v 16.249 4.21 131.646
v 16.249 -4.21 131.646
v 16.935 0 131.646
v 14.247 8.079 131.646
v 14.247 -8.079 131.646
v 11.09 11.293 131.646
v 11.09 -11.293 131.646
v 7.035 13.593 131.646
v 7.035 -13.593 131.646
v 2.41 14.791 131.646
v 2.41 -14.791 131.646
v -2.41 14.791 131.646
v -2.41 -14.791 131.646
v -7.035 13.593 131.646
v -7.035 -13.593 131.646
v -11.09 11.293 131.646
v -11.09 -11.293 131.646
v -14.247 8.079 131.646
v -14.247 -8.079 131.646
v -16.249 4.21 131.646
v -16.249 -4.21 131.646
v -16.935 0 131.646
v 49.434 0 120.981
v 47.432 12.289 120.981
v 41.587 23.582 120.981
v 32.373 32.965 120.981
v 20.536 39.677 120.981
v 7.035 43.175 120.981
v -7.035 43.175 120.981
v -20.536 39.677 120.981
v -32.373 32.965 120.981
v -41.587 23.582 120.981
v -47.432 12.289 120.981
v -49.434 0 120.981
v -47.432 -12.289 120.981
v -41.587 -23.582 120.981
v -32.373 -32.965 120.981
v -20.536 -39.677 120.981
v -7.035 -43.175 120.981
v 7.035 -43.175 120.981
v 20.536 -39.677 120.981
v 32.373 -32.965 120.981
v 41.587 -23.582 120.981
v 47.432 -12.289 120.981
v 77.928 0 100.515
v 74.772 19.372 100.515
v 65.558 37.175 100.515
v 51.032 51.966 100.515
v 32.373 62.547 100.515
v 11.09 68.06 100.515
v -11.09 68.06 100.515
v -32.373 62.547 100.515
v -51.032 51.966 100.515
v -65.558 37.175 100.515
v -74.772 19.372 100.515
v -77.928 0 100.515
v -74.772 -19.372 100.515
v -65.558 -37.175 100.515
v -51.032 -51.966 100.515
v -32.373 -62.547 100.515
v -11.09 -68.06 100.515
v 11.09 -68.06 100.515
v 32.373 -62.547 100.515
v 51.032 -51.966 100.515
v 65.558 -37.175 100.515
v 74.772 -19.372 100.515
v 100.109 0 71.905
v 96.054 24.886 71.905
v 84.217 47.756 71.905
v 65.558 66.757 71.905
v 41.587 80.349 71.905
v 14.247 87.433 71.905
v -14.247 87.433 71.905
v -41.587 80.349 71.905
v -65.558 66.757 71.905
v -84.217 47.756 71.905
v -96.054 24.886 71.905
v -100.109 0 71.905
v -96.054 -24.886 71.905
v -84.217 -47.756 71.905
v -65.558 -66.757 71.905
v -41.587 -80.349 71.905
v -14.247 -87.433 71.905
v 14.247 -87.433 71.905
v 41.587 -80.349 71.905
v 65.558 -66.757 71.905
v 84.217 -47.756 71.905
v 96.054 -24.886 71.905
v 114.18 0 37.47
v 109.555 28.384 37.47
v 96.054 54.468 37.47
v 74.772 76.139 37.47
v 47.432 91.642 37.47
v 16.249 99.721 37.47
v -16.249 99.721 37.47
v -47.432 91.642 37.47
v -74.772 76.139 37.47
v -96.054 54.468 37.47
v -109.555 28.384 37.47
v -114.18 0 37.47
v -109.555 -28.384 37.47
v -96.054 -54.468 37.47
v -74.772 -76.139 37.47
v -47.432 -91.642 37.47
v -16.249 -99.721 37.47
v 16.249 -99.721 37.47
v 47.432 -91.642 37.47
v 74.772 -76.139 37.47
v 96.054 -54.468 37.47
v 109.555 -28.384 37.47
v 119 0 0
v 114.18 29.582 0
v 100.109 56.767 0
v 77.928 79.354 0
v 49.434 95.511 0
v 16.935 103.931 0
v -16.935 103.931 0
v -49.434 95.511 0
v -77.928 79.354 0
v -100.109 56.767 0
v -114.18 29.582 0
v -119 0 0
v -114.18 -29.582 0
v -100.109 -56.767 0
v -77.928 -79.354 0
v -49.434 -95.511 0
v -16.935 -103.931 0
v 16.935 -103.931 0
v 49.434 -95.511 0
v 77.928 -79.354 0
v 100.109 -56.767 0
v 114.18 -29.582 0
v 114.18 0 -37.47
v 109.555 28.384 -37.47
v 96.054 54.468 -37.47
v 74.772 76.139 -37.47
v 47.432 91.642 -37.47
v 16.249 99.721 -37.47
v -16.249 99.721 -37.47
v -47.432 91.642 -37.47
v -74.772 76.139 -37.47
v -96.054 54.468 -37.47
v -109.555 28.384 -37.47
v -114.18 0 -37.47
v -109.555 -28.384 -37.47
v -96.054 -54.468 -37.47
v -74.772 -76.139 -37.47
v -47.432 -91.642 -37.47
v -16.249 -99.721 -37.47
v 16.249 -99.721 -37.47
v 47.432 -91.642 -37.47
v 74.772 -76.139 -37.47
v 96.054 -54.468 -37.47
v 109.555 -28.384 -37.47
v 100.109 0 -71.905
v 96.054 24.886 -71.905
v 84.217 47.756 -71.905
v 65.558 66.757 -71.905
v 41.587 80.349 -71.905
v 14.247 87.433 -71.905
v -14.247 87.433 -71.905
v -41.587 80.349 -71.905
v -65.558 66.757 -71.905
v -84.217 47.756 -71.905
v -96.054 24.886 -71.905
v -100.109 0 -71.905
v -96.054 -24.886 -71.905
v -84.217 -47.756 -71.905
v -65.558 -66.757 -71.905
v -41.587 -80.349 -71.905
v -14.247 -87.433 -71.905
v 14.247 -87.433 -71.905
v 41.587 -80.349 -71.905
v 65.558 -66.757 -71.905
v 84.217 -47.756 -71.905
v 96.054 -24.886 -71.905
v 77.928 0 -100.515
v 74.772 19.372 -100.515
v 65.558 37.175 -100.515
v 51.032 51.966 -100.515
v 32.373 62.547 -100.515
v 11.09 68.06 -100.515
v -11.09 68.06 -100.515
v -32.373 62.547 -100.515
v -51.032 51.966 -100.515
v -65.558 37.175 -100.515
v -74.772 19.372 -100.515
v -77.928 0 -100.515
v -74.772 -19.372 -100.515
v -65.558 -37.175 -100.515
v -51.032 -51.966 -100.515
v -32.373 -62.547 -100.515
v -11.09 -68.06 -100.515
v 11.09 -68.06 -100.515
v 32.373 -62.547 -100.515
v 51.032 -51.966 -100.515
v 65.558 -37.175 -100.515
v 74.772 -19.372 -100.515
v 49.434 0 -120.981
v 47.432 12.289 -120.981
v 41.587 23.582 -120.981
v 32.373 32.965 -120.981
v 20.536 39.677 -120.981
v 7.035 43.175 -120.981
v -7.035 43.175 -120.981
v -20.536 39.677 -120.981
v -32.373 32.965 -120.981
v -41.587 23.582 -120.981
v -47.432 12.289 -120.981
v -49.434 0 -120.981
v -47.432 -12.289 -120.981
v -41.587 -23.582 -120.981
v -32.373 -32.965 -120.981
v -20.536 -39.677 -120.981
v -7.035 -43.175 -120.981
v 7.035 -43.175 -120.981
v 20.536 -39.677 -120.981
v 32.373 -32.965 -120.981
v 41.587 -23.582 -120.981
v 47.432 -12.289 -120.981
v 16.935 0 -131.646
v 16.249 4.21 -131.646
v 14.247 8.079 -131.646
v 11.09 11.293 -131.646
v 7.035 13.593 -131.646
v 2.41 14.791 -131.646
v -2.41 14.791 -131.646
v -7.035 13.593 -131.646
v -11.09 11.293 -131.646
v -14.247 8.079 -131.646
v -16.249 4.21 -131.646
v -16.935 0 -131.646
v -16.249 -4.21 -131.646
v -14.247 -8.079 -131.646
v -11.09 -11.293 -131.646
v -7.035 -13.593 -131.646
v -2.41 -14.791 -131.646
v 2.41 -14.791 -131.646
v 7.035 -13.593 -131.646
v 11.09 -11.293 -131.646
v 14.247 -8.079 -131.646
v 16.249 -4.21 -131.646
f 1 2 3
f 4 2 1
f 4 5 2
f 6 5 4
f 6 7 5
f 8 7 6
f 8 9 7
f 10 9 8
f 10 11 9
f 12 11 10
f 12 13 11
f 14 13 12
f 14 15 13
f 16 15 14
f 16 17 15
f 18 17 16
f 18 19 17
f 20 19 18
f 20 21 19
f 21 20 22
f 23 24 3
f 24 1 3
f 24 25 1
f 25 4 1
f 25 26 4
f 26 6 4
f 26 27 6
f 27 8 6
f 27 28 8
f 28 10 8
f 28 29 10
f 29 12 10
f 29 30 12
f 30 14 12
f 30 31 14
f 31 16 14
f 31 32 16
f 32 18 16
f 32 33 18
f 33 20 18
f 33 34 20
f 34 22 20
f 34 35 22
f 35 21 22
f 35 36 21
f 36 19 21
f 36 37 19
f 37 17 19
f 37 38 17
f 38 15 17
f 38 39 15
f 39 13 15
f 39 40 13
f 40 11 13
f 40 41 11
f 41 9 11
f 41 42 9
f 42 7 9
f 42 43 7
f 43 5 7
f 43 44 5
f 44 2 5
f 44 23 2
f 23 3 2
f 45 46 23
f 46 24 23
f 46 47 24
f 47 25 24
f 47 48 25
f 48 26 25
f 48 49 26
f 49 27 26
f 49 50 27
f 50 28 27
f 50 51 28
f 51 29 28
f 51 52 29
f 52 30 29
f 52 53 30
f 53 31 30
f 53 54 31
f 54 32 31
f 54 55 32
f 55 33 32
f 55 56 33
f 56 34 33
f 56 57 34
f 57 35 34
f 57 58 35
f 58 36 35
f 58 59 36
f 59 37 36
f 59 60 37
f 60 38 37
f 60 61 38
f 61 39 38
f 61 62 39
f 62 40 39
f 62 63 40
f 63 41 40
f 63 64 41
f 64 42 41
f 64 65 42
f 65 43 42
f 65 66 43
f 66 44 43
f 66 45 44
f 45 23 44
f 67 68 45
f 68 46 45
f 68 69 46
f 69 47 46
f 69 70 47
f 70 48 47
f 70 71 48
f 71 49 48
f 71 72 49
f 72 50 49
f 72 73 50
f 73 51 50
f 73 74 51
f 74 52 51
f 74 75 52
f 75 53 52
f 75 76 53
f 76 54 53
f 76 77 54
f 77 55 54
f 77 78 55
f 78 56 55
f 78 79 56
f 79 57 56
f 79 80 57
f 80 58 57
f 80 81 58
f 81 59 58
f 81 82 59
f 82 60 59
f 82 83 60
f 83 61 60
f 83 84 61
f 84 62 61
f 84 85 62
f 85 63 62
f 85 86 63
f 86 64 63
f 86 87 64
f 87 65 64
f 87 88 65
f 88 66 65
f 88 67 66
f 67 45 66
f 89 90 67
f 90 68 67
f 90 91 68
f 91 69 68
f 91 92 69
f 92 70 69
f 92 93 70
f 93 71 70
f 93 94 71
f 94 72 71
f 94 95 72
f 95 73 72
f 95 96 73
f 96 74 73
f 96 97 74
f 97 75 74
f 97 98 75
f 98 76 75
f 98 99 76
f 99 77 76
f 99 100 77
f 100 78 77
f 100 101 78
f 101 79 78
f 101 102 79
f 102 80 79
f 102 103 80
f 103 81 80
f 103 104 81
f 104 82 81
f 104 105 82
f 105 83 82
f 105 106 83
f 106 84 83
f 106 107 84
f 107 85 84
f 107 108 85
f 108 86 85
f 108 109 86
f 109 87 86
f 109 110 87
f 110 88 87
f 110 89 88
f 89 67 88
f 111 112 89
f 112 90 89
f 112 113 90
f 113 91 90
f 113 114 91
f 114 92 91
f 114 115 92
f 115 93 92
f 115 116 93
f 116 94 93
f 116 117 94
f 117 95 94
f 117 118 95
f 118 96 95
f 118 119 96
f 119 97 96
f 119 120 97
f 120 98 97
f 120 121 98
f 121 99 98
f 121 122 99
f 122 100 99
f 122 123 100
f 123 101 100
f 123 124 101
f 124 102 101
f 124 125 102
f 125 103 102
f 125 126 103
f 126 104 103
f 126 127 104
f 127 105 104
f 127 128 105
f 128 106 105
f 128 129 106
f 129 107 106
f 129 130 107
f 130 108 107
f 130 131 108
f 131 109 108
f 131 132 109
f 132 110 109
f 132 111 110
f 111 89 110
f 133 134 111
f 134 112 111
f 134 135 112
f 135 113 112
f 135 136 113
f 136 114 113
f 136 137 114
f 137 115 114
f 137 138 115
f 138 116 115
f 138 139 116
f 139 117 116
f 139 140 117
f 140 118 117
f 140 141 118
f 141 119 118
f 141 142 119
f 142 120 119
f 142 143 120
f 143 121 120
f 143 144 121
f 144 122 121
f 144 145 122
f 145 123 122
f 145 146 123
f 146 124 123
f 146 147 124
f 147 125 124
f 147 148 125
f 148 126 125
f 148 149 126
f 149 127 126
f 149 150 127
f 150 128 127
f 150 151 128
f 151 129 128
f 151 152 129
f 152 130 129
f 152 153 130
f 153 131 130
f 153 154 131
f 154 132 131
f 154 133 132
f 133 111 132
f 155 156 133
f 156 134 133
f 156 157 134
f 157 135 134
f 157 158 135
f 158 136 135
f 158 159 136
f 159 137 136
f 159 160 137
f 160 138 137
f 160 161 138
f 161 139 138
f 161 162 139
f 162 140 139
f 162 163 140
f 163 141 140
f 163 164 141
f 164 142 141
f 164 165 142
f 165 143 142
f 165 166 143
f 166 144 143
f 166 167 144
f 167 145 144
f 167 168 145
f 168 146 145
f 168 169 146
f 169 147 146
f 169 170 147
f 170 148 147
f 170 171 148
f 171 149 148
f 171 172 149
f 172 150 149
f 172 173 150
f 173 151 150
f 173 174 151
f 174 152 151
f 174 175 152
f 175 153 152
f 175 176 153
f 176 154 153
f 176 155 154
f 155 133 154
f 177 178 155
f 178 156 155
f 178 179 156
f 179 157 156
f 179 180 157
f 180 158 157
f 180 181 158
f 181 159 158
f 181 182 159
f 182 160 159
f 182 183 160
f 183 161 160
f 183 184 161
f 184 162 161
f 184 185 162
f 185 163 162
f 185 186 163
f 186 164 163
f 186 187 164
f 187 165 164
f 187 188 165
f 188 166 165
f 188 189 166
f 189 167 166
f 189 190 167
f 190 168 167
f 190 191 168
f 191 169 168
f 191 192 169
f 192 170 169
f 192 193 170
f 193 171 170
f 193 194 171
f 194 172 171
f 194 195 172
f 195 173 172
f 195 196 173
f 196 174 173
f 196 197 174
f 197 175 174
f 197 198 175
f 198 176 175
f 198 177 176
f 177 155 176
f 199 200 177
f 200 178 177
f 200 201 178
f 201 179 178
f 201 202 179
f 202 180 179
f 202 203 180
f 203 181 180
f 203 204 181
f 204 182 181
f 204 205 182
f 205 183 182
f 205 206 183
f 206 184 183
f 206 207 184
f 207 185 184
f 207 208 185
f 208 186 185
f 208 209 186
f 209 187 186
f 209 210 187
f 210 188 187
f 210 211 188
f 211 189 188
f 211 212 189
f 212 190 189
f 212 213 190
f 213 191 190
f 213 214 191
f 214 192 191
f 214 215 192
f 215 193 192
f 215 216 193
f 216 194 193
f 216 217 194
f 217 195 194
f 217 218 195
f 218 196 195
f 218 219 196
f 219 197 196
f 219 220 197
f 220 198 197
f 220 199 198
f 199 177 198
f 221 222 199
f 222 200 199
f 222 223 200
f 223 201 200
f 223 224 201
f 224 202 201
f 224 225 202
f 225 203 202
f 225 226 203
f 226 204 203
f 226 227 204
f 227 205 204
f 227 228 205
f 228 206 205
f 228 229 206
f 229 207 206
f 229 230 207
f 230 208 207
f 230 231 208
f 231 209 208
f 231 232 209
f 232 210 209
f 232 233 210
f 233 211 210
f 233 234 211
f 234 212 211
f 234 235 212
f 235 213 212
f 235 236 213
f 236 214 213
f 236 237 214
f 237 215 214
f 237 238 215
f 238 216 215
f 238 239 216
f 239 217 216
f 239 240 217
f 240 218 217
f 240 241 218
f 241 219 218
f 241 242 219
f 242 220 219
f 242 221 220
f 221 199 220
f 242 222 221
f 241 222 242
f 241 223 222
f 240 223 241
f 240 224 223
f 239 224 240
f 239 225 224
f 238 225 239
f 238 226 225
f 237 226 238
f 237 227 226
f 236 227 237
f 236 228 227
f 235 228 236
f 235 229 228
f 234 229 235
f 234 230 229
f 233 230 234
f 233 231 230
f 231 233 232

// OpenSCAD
// Generated by SolidPython 1.0.1 on 2020-07-29 00:46:53


scale(v = [17, 15, 19]) {
	sphere(r = 7);
}
/***********************************************
*********      SolidPython code:      **********
************************************************
 
# import packages: SolidPython
from solid import *
from solid.utils import *
from itertools import chain, combinations, permutations


class Resize:

    def __init__(self, scad_file):
        self.scad_file = scad_file
        #self.scad_file = import_scad(scad_file)
        # cone/cylinder param:
        self.r1 = 0
        self.r2 = 0
        self.h = 0
        # rectangular prism param:
        self.w = 0
        self.l = 0
        # ellipse param:
        self.r = 0

    # import OpenScad code (file name corresponds to shape)


    # classify shape + parameters
    def assign(self, param1, param2, param3):
        if self.scad_file == 'cone.scad':
            self.r1 = param1
            self.r2 = param2
            self.h = param3
        elif self.scad_file == 'cylinder.scad':
            self.r1 = param1
            self.r2 = param2
            self.h = param3
        elif self.scad_file == 'rectangularPrism.scad':
            self.h = param1
            self.l = param2
            self.w = param3
        else:
            self.r = param1
            self.h = param2

    # resize parameters
    def iterate(self):
        x = range(3, 20, 2)
        i = 1
        if self.scad_file == 'cone.scad':
            tempList = list(permutations(x, 2))
            for temp in tempList:
                param1 = temp[0]
                param2 = temp[1]
                filepath = 'produced_scad_files/' + 'cone' + str(param1) + '_' + str(param2) + '_' + '.scad'
                scad_render_to_file(cylinder(h=param1, r1=param2, r2=0), filepath)

        elif self.scad_file == 'cylinder.scad':
            tempList = list(permutations(x, 3))
            for temp in tempList:
                param1 = temp[0]
                param2 = temp[1]
                filepath = 'produced_scad_files/' + 'cylinder' + str(param1) + '_' + str(param2) + '_' + '.scad'
                scad_render_to_file(cylinder(h=param1, r1=param2, r2=param2), filepath)

        elif self.scad_file == 'rectangularPrism.scad':
            tempList = list(permutations(x, 3))
            for temp in tempList:
                param1 = temp[0]
                param2 = temp[1]
                param3 = temp[2]
                filepath = 'produced_scad_files/' + 'rectangularPrism' + str(param1) + '_' + str(param2) + '_' + str(
                    param3) + '.scad'
                scad_render_to_file(cube(size=(param1, param2, param3)), filepath)

        elif self.scad_file == 'ellipse.scad':
            tempList = list(permutations(x, 4))
            for temp in tempList:
                param1 = temp[0]
                param2 = temp[1]
                param3 = temp[2]
                param4 = temp[3]
                filepath = 'produced_scad_files/' + 'ellipse' + str(param1) + '_' + str(param2) + '_' + str(param3) + '_' + str(param4) + '.scad'
                scad_render_to_file(scale([param1, param2, param3])(sphere(r=param4)), filepath)

    def render_to_scadfile(self):
        scad_render_to_file(scad, 'example.scad') 
 
************************************************/
